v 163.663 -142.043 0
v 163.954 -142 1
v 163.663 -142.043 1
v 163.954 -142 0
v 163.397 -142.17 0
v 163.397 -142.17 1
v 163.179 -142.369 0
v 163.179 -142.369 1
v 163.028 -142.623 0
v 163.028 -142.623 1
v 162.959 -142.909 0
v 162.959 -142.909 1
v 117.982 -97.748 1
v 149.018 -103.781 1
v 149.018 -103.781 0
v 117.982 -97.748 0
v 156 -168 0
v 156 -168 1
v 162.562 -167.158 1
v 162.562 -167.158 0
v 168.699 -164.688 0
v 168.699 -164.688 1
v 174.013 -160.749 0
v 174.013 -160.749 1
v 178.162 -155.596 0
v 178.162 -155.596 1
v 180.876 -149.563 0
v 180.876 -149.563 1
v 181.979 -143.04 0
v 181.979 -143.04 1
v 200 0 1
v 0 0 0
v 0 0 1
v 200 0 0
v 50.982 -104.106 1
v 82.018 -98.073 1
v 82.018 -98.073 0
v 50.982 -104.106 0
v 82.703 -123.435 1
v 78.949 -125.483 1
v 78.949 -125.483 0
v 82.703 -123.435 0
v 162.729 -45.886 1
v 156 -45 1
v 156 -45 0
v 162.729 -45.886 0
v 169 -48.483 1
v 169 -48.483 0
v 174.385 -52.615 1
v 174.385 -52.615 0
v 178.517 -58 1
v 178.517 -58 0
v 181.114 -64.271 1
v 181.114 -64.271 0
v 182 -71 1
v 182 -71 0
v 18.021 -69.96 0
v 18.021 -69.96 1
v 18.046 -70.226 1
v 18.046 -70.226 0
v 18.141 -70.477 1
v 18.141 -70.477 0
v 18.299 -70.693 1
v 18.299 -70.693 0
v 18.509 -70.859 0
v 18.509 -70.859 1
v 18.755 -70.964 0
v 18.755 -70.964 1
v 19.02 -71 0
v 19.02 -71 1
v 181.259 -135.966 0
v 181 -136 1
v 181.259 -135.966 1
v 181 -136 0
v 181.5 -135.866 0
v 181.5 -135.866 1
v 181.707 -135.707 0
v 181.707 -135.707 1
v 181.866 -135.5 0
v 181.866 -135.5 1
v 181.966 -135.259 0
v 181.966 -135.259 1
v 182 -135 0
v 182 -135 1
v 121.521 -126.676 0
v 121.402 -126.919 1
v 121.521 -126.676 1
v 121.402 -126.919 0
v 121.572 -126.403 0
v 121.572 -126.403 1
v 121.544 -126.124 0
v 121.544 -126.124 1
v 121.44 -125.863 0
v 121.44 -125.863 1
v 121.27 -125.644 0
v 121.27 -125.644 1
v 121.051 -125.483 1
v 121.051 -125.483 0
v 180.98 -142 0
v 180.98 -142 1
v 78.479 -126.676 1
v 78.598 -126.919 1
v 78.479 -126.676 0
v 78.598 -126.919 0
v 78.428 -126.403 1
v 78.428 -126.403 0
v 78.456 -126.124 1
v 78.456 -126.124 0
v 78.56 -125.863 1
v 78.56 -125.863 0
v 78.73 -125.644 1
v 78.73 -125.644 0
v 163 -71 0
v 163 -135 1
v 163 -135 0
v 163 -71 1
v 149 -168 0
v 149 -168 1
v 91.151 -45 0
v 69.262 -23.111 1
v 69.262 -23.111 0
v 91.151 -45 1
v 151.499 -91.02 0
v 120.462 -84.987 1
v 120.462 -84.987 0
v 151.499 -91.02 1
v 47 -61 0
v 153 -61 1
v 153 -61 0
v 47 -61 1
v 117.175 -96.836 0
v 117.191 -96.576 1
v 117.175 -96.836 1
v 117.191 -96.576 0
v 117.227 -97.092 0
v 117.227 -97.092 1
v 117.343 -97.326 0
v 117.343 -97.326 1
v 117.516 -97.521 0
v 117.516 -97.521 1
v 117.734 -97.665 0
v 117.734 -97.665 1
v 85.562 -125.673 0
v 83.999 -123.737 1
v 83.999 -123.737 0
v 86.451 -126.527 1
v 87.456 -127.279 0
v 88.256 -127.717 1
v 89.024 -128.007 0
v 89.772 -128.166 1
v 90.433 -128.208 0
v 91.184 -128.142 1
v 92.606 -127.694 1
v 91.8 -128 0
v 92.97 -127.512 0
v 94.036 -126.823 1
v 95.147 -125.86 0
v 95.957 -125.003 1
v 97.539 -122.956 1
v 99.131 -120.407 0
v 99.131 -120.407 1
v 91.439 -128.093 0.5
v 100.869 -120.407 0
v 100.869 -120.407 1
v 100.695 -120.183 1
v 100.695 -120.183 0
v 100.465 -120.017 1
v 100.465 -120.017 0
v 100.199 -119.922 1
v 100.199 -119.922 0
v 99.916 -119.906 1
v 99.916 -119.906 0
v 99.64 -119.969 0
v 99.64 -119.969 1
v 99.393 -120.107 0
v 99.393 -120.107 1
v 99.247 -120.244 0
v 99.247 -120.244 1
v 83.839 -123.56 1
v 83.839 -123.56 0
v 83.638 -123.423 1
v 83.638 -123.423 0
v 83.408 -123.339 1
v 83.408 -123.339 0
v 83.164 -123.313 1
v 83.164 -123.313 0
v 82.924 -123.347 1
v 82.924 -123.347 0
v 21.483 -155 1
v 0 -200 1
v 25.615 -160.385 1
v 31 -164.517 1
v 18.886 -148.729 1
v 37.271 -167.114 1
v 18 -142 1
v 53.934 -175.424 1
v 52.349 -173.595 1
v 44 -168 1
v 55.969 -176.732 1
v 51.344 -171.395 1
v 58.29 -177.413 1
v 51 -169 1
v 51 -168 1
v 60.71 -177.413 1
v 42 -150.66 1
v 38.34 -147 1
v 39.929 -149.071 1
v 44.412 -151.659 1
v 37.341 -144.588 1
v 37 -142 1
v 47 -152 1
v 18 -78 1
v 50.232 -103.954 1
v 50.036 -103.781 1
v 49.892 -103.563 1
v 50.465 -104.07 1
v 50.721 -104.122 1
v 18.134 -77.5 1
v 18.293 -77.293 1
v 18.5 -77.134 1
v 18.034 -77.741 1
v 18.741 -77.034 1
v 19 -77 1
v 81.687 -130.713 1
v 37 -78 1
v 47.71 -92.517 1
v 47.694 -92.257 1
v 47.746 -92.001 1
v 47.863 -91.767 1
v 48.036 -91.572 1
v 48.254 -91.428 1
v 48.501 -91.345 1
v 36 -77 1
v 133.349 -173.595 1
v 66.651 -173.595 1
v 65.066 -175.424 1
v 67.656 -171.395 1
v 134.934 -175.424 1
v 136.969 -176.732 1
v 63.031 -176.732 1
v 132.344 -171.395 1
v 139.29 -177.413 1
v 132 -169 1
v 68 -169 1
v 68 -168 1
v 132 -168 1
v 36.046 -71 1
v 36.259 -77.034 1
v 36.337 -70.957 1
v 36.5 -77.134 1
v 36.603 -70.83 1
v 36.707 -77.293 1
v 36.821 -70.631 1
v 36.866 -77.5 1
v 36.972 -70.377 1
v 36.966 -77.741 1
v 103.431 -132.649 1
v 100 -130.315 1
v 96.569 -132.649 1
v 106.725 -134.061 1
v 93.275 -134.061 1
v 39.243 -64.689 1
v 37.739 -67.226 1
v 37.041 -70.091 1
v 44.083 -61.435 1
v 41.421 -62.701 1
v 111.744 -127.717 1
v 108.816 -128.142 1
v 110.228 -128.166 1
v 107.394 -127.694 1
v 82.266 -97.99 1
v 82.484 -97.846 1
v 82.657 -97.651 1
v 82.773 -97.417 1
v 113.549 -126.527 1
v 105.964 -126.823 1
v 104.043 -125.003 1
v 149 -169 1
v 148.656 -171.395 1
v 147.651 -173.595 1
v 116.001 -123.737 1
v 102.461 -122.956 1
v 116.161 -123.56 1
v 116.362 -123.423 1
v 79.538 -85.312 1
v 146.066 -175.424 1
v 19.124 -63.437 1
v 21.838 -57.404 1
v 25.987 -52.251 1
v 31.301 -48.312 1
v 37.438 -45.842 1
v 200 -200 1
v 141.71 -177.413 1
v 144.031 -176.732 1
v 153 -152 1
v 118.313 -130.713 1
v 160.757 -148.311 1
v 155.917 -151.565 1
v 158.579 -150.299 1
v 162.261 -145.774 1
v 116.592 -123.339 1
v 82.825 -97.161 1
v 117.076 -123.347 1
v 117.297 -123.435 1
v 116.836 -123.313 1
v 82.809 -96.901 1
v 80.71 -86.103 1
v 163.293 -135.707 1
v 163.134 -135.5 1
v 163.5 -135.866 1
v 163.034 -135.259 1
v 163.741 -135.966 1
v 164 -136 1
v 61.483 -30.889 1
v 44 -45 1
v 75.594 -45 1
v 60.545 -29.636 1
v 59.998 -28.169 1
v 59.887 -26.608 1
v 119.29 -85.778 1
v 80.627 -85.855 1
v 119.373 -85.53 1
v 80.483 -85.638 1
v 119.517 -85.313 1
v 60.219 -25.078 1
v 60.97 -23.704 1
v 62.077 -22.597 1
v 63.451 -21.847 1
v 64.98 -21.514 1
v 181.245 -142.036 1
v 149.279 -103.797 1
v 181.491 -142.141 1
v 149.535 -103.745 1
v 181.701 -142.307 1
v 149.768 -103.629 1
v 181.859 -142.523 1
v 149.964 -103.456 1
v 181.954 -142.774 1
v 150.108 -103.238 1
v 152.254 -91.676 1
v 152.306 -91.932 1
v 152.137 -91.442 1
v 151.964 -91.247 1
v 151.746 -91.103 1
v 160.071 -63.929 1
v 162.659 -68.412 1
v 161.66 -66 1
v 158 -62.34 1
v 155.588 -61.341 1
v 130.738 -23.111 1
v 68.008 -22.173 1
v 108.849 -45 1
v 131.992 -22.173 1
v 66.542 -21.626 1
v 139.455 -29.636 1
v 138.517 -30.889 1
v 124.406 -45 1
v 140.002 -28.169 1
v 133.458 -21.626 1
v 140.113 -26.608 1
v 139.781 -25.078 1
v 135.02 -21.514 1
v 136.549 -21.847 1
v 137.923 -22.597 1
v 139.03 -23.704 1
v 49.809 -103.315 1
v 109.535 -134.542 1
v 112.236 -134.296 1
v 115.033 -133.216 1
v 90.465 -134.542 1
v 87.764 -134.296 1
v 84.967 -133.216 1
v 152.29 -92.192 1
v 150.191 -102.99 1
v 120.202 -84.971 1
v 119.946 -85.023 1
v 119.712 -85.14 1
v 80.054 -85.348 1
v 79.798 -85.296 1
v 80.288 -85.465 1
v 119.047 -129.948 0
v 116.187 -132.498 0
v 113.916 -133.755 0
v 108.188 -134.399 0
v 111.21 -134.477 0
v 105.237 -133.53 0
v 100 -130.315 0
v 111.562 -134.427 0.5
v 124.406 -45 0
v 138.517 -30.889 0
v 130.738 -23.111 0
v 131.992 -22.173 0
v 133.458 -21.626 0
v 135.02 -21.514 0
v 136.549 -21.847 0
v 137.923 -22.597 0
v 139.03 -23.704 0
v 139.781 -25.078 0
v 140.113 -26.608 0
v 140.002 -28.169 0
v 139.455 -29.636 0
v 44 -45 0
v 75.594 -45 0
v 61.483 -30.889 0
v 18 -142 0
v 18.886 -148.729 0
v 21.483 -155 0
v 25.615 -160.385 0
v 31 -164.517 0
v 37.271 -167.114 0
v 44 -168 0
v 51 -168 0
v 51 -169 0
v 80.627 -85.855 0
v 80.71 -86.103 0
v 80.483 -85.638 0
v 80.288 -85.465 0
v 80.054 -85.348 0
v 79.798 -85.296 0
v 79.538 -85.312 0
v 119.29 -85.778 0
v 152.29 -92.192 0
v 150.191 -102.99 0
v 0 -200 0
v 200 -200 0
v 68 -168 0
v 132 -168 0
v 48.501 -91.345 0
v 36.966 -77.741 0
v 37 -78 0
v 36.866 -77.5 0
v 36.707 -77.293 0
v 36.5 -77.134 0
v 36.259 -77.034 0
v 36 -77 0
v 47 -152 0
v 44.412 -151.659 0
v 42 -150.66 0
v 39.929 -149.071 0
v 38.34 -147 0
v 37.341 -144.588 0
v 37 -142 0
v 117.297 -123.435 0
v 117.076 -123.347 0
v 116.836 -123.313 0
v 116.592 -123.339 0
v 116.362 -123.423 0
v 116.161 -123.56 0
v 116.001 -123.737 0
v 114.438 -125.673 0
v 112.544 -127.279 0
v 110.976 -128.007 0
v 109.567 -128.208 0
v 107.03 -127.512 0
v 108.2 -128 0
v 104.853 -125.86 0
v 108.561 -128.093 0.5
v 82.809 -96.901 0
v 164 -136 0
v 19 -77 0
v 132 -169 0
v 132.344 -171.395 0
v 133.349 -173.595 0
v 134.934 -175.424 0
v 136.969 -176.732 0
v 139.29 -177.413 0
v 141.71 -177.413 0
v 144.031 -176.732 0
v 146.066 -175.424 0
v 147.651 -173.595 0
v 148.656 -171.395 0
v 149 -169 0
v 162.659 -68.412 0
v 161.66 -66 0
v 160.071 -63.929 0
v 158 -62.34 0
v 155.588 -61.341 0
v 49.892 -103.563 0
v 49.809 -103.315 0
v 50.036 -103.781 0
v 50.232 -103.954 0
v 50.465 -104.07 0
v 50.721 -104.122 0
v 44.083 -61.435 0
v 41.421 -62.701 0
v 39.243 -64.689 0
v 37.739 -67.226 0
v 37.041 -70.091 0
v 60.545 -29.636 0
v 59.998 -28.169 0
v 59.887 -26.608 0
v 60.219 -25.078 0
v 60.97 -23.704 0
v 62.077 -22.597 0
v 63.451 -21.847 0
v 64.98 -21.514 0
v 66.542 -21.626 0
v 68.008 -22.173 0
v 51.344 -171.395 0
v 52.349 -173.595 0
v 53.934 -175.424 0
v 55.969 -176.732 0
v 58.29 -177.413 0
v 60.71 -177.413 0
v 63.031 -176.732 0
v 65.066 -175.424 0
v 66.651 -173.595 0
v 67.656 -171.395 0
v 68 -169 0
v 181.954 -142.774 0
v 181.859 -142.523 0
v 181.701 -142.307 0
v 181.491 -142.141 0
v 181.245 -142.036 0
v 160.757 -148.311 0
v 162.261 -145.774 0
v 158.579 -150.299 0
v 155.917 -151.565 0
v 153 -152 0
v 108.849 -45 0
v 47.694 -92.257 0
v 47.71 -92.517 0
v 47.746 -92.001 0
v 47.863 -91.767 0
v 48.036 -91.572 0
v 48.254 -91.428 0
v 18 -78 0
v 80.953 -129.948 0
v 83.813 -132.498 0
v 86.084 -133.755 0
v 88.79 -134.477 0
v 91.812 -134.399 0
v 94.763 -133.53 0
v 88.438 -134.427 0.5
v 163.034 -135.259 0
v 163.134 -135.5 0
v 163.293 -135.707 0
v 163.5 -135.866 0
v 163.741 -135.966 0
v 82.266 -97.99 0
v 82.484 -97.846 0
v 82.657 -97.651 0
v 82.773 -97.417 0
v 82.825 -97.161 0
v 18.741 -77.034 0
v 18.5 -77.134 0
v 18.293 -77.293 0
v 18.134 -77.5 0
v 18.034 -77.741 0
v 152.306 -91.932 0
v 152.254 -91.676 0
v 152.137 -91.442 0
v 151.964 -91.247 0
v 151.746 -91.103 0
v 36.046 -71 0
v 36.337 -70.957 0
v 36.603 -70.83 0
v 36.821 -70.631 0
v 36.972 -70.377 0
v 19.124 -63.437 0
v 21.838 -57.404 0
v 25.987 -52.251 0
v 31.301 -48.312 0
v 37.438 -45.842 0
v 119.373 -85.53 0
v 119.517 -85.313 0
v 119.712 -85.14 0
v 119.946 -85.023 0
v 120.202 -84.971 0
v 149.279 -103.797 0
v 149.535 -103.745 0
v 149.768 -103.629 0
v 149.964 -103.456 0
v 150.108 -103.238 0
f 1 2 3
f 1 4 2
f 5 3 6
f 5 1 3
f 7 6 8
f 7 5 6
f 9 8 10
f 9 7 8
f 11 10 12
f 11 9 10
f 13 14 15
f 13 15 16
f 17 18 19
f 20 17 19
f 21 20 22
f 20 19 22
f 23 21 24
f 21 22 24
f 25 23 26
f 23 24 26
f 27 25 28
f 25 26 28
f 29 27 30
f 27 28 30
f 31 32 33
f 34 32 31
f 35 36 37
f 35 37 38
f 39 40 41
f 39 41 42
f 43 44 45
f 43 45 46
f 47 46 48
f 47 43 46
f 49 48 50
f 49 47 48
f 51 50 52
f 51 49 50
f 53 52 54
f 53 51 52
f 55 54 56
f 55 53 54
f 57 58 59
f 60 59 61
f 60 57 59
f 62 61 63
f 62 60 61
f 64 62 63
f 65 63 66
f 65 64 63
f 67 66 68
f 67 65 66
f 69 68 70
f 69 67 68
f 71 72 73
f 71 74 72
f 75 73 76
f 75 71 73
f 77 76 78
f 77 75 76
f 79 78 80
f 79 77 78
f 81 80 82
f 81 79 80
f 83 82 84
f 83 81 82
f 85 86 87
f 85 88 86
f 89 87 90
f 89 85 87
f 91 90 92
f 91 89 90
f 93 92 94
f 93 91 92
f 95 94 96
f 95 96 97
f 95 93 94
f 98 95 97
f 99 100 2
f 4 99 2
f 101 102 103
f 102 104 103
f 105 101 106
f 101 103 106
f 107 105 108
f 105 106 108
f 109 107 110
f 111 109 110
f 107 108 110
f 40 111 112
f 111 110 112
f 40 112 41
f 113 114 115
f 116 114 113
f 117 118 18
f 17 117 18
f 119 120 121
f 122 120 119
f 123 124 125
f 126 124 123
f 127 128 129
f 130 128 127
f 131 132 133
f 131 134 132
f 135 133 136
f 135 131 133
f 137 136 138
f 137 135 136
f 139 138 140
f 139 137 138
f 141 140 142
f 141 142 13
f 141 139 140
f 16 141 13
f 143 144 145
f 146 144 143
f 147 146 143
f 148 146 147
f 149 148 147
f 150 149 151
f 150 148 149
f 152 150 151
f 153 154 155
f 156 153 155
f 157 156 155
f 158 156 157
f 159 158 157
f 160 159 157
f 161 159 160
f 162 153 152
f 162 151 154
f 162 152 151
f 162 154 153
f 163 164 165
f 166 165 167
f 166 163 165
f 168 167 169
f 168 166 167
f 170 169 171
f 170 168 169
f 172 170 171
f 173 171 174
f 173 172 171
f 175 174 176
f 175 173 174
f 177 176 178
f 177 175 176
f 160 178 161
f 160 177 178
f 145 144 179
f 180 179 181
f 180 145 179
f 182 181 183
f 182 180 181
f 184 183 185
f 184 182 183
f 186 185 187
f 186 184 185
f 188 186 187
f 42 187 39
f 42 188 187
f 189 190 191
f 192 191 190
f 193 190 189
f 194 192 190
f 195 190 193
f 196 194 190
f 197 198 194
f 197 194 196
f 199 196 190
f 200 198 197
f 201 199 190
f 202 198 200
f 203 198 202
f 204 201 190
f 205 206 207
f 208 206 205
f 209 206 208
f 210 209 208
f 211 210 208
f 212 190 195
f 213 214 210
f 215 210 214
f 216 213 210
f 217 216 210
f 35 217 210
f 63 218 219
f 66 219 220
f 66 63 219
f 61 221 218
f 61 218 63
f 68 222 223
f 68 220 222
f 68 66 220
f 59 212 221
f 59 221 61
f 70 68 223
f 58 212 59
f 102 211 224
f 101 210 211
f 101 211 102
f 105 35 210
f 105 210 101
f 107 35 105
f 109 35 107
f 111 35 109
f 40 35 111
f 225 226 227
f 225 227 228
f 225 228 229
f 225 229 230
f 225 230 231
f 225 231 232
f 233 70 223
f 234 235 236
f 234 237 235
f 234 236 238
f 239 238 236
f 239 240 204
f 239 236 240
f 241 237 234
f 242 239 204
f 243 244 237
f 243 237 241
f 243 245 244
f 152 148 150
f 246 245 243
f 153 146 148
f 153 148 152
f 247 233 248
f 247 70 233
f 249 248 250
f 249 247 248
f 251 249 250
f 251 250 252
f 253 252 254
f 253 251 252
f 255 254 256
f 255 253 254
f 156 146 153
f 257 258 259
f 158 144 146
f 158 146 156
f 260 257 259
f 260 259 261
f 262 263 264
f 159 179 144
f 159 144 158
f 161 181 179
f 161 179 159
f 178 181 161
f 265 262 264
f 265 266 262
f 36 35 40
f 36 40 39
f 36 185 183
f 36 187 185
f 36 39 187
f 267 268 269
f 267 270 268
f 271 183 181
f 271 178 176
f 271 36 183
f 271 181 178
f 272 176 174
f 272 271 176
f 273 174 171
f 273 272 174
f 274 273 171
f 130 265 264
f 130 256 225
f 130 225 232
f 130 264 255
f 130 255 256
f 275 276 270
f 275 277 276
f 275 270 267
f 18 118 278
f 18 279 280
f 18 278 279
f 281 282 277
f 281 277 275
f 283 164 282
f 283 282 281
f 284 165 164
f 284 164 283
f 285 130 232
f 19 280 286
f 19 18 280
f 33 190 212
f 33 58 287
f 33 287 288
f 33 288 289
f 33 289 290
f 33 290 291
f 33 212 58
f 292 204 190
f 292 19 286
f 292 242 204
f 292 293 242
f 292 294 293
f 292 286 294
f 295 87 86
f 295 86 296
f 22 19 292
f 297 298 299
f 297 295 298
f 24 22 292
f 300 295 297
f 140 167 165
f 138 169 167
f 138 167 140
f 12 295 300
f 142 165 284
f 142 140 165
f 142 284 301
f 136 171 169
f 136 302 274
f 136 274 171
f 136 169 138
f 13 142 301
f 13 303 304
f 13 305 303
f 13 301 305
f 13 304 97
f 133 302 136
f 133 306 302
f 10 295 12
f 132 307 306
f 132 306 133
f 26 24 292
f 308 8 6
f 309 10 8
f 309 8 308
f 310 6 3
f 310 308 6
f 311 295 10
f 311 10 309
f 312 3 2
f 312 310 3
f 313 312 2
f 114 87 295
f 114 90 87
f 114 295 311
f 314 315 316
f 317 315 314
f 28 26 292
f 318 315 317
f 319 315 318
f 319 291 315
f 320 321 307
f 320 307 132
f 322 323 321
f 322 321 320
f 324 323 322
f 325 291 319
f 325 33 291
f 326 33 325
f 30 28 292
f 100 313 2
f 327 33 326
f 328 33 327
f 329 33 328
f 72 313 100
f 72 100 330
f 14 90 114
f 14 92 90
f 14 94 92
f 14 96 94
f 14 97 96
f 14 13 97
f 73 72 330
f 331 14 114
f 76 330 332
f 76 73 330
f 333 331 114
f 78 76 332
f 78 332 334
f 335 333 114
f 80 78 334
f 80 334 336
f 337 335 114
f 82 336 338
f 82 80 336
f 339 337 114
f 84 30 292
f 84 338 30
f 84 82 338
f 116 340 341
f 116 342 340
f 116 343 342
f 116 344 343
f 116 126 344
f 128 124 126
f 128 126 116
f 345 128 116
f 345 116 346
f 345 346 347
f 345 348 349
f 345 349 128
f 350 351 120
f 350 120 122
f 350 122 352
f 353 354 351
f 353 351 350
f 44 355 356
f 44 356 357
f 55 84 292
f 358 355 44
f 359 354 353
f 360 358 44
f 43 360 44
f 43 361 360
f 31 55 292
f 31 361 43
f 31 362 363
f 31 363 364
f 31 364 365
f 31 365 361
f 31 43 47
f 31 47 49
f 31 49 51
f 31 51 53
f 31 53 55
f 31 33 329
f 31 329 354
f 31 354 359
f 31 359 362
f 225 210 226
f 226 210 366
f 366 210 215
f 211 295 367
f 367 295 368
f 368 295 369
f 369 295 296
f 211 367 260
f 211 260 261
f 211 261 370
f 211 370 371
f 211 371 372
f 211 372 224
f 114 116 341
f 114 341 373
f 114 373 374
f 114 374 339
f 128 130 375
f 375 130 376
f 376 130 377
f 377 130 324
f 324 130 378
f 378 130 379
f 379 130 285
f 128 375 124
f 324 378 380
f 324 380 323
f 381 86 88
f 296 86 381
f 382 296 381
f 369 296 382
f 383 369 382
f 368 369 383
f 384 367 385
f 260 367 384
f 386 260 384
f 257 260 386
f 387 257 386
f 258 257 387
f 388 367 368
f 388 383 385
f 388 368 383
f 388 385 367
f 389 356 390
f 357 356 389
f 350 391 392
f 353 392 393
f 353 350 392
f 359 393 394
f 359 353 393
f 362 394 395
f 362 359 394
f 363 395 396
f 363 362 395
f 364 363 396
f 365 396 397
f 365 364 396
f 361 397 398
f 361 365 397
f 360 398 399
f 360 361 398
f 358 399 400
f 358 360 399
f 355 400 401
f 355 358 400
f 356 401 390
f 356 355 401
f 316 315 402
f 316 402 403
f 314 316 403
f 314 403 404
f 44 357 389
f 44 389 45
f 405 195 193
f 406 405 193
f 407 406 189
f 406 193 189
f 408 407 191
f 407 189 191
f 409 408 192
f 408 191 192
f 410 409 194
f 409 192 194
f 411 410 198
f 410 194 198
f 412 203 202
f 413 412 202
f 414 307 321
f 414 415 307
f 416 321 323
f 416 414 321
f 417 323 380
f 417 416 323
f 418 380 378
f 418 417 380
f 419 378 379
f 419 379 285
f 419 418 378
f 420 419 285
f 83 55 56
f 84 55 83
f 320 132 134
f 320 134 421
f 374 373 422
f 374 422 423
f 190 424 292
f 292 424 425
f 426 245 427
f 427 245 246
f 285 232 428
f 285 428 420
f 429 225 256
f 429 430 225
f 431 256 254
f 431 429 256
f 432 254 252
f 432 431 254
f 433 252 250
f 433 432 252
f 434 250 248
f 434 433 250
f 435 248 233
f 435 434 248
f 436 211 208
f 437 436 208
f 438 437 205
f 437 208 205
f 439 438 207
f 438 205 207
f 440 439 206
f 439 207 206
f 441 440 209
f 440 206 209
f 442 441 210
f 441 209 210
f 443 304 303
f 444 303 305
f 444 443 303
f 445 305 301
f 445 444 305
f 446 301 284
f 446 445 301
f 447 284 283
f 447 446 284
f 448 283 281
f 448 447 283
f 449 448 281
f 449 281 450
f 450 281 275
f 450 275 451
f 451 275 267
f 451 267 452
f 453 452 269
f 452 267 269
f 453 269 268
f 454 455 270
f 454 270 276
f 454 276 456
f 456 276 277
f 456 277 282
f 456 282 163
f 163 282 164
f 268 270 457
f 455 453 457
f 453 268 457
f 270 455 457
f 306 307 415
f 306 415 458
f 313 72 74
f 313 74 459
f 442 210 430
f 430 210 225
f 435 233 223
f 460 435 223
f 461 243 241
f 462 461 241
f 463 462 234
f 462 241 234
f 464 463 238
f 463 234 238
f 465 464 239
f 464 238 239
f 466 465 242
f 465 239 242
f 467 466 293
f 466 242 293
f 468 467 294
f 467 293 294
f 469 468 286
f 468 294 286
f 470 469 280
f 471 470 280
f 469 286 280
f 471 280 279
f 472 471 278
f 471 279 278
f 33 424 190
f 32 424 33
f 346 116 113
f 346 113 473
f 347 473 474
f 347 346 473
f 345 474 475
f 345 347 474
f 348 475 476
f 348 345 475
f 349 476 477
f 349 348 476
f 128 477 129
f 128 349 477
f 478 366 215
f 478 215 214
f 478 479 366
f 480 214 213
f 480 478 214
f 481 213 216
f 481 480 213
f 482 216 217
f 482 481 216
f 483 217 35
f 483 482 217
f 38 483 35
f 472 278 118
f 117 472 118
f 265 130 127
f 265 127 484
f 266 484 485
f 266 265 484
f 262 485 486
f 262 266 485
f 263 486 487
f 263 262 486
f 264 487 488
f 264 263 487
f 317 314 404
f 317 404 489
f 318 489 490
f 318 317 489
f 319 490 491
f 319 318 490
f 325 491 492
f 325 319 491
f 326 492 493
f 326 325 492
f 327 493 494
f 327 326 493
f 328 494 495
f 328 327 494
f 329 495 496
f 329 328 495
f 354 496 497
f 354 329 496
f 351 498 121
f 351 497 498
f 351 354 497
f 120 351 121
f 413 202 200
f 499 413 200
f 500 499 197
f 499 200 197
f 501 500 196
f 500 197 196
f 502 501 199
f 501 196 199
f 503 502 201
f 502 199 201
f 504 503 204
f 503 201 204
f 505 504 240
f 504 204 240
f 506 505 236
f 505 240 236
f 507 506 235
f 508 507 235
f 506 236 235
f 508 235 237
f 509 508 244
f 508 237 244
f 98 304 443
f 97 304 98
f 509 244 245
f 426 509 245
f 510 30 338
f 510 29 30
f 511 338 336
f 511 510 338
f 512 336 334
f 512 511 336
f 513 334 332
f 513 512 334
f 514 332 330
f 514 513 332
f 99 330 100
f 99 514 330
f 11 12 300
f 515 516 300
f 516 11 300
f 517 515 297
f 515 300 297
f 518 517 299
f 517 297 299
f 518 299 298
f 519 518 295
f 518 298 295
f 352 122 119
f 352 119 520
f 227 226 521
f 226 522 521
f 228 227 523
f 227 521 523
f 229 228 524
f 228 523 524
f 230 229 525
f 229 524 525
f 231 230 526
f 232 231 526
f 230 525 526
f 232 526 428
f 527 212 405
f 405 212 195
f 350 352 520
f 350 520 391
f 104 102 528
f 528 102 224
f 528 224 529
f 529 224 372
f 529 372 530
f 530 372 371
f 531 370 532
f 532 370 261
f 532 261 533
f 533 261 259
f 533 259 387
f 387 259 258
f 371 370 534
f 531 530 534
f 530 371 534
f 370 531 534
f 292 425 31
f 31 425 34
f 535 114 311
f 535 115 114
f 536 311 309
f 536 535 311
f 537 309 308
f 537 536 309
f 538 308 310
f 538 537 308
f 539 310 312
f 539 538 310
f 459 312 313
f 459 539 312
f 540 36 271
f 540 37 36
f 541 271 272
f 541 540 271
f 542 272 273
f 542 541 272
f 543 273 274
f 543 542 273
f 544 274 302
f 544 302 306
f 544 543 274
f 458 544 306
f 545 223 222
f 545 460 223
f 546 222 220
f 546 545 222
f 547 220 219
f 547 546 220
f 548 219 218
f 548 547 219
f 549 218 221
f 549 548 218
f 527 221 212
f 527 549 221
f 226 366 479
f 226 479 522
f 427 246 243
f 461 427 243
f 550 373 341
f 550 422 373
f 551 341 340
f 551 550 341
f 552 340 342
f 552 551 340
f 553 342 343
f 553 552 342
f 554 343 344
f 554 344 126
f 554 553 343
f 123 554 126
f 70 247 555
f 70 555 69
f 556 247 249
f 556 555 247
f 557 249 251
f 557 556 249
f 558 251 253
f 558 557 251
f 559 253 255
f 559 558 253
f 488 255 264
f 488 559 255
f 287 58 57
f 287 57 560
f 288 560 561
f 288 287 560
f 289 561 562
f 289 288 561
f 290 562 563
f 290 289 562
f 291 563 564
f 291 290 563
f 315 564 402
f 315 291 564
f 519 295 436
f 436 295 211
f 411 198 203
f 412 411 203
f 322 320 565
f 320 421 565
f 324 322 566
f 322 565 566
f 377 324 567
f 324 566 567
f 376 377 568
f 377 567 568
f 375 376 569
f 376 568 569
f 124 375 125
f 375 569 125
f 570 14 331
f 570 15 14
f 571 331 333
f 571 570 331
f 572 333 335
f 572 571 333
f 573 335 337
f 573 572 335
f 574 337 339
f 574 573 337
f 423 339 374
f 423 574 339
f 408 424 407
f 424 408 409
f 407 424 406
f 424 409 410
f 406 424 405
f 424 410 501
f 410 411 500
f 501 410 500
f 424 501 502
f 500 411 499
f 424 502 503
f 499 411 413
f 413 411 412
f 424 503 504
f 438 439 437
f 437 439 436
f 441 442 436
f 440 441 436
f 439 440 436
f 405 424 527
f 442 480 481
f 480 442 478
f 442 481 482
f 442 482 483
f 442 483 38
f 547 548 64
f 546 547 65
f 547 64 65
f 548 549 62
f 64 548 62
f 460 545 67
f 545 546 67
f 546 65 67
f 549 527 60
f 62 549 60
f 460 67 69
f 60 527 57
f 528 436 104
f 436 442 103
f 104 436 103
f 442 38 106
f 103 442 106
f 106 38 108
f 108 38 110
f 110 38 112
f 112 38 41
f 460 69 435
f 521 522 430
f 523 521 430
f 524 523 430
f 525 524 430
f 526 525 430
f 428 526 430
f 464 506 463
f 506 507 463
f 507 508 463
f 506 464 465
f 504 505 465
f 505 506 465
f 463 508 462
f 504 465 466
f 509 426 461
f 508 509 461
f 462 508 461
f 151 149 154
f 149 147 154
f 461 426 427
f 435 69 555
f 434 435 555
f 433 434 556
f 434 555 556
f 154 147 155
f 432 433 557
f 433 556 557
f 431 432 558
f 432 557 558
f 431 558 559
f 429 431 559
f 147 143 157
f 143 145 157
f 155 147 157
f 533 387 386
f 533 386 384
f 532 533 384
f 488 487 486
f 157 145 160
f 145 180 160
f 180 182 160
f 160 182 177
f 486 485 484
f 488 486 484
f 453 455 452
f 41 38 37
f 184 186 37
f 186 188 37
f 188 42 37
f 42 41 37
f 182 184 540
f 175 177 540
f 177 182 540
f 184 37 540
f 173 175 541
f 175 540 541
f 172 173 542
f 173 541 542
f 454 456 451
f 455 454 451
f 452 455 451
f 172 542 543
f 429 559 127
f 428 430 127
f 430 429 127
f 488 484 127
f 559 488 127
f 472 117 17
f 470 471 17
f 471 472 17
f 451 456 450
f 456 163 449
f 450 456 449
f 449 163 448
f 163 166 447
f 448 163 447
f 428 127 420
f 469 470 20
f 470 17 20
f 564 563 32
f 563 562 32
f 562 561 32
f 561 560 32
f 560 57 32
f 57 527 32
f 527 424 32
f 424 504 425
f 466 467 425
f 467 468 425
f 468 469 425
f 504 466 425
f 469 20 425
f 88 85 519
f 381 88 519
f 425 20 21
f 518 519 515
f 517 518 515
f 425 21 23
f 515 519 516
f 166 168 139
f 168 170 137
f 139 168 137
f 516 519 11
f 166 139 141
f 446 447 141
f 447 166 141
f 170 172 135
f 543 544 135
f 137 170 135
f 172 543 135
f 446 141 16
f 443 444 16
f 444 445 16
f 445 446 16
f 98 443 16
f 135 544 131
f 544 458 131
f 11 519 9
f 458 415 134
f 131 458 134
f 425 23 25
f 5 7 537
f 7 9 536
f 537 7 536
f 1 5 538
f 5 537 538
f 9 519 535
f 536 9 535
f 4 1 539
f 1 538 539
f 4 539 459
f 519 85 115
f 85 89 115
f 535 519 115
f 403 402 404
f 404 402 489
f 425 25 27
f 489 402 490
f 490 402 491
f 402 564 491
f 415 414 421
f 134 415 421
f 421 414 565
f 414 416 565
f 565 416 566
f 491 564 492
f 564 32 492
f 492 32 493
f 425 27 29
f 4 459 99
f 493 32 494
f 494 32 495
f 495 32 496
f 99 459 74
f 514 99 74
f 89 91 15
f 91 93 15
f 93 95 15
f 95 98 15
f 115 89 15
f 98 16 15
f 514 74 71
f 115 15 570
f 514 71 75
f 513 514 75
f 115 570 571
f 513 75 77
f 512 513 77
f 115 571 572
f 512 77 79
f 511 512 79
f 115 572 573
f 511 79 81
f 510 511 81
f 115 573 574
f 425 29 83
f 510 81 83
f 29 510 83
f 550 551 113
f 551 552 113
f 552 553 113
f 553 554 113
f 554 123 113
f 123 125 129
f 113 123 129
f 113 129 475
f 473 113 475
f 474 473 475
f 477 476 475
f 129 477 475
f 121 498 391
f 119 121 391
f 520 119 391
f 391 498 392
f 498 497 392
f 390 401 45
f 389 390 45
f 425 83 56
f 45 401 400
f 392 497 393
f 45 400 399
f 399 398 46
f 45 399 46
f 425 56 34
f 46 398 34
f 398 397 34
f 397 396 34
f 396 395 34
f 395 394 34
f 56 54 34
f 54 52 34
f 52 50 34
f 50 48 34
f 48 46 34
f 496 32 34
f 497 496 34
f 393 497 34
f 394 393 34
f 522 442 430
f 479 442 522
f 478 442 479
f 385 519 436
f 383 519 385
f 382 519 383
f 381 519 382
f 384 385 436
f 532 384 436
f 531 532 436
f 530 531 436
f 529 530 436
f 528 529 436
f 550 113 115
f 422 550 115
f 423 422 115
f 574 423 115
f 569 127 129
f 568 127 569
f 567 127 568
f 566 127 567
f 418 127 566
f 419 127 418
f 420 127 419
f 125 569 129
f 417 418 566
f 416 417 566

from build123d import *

# Parameters (mm, degrees)
SKETCH_1_W       = 200
SKETCH_1_H       = 200
BACKGROUND_DEPTH = 1
LOGO_DEPTH       = 10
FILLET_R_R       = 1


with BuildPart() as part:
    # 草图1 → Background (new body)
    with BuildSketch(Plane.XY):
        with Locations((100, -100)):
            Rectangle(SKETCH_1_W, SKETCH_1_H)
    extrude(amount=BACKGROUND_DEPTH)

    # 草图2 → Logo (cut)
    with BuildSketch(Plane.XY.offset(1)):
        with BuildLine():
            Line((44, -45), (75.594408409, -45))
            Line((75.594408409, -45), (61.483495706, -30.889087297))
            ThreePointArc((61.483495706, -30.889087297), (61.483495706, -23.110912703), (69.261670299, -23.110912703))
            Line((69.261670299, -23.110912703), (91.150757595, -45))
            Line((91.150757595, -45), (108.849242405, -45))
            Line((108.849242405, -45), (130.738329701, -23.110912703))
            ThreePointArc((130.738329701, -23.110912703), (138.516504294, -23.110912703), (138.516504294, -30.889087297))
            Line((138.516504294, -30.889087297), (124.405591591, -45))
            Line((124.405591591, -45), (156, -45))
            ThreePointArc((156, -45), (174.384776311, -52.615223689), (182, -71))
            Line((182, -71), (182, -136))
            Line((182, -136), (163, -136))
            Line((163, -136), (163, -71))
            ThreePointArc((163, -71), (160.071067812, -63.928932188), (153, -61))
            Line((153, -61), (47, -61))
            ThreePointArc((47, -61), (39.928932188, -63.928932188), (37, -71))
            Line((37, -71), (18, -71))
            ThreePointArc((18, -71), (25.615223689, -52.615223689), (44, -45))
        make_face()
        with BuildLine():
            Line((44, -168), (51, -168))
            Line((51, -168), (51, -169))
            ThreePointArc((51, -169), (59.5, -177.5), (68, -169))
            Line((68, -169), (68, -168))
            Line((68, -168), (132, -168))
            Line((132, -168), (132, -169))
            ThreePointArc((132, -169), (140.5, -177.5), (149, -169))
            Line((149, -169), (149, -168))
            Line((149, -168), (156, -168))
            ThreePointArc((156, -168), (174.384776311, -160.384776311), (182, -142))
            Line((182, -142), (163, -142))
            ThreePointArc((163, -142), (160.071067812, -149.071067812), (153, -152))
            Line((153, -152), (47, -152))
            ThreePointArc((47, -152), (39.928932188, -149.071067812), (37, -142))
            Line((37, -142), (37, -77))
            Line((37, -77), (18, -77))
            Line((18, -77), (18, -142))
            ThreePointArc((18, -142), (25.615223689, -160.384776311), (44, -168))
        make_face()
        Polygon((47.51948306, -91.53578191), (80.51948306, -85.121231708), (83, -97.882385093), (50, -104.296935295), align=None)
        Polygon((119.48051694, -84.796316416), (152.48051694, -91.210866617), (150, -103.972020002), (117, -97.557469801), align=None)
        with BuildLine():
            Line((78, -126), (83.5, -123))
            add(Edge.make_bspline(
                [(83.5, -123), (91.450014857, -135.202864972), (100, -118.812493298)],
                knots=[0, 0, 0, 1, 1, 1], degree=2))
            add(Edge.make_bspline(
                [(116.5, -123), (108.549985143, -135.202864972), (100, -118.812493298)],
                knots=[0, 0, 0, 1, 1, 1], degree=2))
            Line((116.5, -123), (122, -126))
            add(Edge.make_bspline(
                [(122, -126), (112.840164848, -140.569491763), (100, -130.315373567)],
                knots=[0, 0, 0, 1, 1, 1], degree=2))
            add(Edge.make_bspline(
                [(78, -126), (87.159835152, -140.569491763), (100, -130.315373567)],
                knots=[0, 0, 0, 1, 1, 1], degree=2))
        make_face()
    extrude(amount=-LOGO_DEPTH, mode=Mode.SUBTRACT)

    # R
    fillet_r_edges = [part.edges().sort_by_distance(p)[0] for p in [
        (122, -126, 0.5),
        (116.5, -123, 0.5),
        (100, -118.812493298, 0.5),
        (78, -126, 0.5),
        (83.5, -123, 0.5),
        (117, -97.557469801, 0.5),
        (150, -103.972020002, 0.5),
        (152.48051694, -91.210866617, 0.5),
        (119.48051694, -84.796316416, 0.5),
        (50, -104.296935295, 0.5),
        (83, -97.882385093, 0.5),
        (80.51948306, -85.121231708, 0.5),
        (47.51948306, -91.53578191, 0.5),
        (163, -142, 0.5),
        (182, -142, 0.5),
        (182, -136, 0.5),
        (163, -136, 0.5),
        (18, -71, 0.5),
        (37, -71, 0.5),
        (37, -77, 0.5),
        (18, -77, 0.5),
    ]]
    fillet(fillet_r_edges, radius=FILLET_R_R)


solid = part.part
